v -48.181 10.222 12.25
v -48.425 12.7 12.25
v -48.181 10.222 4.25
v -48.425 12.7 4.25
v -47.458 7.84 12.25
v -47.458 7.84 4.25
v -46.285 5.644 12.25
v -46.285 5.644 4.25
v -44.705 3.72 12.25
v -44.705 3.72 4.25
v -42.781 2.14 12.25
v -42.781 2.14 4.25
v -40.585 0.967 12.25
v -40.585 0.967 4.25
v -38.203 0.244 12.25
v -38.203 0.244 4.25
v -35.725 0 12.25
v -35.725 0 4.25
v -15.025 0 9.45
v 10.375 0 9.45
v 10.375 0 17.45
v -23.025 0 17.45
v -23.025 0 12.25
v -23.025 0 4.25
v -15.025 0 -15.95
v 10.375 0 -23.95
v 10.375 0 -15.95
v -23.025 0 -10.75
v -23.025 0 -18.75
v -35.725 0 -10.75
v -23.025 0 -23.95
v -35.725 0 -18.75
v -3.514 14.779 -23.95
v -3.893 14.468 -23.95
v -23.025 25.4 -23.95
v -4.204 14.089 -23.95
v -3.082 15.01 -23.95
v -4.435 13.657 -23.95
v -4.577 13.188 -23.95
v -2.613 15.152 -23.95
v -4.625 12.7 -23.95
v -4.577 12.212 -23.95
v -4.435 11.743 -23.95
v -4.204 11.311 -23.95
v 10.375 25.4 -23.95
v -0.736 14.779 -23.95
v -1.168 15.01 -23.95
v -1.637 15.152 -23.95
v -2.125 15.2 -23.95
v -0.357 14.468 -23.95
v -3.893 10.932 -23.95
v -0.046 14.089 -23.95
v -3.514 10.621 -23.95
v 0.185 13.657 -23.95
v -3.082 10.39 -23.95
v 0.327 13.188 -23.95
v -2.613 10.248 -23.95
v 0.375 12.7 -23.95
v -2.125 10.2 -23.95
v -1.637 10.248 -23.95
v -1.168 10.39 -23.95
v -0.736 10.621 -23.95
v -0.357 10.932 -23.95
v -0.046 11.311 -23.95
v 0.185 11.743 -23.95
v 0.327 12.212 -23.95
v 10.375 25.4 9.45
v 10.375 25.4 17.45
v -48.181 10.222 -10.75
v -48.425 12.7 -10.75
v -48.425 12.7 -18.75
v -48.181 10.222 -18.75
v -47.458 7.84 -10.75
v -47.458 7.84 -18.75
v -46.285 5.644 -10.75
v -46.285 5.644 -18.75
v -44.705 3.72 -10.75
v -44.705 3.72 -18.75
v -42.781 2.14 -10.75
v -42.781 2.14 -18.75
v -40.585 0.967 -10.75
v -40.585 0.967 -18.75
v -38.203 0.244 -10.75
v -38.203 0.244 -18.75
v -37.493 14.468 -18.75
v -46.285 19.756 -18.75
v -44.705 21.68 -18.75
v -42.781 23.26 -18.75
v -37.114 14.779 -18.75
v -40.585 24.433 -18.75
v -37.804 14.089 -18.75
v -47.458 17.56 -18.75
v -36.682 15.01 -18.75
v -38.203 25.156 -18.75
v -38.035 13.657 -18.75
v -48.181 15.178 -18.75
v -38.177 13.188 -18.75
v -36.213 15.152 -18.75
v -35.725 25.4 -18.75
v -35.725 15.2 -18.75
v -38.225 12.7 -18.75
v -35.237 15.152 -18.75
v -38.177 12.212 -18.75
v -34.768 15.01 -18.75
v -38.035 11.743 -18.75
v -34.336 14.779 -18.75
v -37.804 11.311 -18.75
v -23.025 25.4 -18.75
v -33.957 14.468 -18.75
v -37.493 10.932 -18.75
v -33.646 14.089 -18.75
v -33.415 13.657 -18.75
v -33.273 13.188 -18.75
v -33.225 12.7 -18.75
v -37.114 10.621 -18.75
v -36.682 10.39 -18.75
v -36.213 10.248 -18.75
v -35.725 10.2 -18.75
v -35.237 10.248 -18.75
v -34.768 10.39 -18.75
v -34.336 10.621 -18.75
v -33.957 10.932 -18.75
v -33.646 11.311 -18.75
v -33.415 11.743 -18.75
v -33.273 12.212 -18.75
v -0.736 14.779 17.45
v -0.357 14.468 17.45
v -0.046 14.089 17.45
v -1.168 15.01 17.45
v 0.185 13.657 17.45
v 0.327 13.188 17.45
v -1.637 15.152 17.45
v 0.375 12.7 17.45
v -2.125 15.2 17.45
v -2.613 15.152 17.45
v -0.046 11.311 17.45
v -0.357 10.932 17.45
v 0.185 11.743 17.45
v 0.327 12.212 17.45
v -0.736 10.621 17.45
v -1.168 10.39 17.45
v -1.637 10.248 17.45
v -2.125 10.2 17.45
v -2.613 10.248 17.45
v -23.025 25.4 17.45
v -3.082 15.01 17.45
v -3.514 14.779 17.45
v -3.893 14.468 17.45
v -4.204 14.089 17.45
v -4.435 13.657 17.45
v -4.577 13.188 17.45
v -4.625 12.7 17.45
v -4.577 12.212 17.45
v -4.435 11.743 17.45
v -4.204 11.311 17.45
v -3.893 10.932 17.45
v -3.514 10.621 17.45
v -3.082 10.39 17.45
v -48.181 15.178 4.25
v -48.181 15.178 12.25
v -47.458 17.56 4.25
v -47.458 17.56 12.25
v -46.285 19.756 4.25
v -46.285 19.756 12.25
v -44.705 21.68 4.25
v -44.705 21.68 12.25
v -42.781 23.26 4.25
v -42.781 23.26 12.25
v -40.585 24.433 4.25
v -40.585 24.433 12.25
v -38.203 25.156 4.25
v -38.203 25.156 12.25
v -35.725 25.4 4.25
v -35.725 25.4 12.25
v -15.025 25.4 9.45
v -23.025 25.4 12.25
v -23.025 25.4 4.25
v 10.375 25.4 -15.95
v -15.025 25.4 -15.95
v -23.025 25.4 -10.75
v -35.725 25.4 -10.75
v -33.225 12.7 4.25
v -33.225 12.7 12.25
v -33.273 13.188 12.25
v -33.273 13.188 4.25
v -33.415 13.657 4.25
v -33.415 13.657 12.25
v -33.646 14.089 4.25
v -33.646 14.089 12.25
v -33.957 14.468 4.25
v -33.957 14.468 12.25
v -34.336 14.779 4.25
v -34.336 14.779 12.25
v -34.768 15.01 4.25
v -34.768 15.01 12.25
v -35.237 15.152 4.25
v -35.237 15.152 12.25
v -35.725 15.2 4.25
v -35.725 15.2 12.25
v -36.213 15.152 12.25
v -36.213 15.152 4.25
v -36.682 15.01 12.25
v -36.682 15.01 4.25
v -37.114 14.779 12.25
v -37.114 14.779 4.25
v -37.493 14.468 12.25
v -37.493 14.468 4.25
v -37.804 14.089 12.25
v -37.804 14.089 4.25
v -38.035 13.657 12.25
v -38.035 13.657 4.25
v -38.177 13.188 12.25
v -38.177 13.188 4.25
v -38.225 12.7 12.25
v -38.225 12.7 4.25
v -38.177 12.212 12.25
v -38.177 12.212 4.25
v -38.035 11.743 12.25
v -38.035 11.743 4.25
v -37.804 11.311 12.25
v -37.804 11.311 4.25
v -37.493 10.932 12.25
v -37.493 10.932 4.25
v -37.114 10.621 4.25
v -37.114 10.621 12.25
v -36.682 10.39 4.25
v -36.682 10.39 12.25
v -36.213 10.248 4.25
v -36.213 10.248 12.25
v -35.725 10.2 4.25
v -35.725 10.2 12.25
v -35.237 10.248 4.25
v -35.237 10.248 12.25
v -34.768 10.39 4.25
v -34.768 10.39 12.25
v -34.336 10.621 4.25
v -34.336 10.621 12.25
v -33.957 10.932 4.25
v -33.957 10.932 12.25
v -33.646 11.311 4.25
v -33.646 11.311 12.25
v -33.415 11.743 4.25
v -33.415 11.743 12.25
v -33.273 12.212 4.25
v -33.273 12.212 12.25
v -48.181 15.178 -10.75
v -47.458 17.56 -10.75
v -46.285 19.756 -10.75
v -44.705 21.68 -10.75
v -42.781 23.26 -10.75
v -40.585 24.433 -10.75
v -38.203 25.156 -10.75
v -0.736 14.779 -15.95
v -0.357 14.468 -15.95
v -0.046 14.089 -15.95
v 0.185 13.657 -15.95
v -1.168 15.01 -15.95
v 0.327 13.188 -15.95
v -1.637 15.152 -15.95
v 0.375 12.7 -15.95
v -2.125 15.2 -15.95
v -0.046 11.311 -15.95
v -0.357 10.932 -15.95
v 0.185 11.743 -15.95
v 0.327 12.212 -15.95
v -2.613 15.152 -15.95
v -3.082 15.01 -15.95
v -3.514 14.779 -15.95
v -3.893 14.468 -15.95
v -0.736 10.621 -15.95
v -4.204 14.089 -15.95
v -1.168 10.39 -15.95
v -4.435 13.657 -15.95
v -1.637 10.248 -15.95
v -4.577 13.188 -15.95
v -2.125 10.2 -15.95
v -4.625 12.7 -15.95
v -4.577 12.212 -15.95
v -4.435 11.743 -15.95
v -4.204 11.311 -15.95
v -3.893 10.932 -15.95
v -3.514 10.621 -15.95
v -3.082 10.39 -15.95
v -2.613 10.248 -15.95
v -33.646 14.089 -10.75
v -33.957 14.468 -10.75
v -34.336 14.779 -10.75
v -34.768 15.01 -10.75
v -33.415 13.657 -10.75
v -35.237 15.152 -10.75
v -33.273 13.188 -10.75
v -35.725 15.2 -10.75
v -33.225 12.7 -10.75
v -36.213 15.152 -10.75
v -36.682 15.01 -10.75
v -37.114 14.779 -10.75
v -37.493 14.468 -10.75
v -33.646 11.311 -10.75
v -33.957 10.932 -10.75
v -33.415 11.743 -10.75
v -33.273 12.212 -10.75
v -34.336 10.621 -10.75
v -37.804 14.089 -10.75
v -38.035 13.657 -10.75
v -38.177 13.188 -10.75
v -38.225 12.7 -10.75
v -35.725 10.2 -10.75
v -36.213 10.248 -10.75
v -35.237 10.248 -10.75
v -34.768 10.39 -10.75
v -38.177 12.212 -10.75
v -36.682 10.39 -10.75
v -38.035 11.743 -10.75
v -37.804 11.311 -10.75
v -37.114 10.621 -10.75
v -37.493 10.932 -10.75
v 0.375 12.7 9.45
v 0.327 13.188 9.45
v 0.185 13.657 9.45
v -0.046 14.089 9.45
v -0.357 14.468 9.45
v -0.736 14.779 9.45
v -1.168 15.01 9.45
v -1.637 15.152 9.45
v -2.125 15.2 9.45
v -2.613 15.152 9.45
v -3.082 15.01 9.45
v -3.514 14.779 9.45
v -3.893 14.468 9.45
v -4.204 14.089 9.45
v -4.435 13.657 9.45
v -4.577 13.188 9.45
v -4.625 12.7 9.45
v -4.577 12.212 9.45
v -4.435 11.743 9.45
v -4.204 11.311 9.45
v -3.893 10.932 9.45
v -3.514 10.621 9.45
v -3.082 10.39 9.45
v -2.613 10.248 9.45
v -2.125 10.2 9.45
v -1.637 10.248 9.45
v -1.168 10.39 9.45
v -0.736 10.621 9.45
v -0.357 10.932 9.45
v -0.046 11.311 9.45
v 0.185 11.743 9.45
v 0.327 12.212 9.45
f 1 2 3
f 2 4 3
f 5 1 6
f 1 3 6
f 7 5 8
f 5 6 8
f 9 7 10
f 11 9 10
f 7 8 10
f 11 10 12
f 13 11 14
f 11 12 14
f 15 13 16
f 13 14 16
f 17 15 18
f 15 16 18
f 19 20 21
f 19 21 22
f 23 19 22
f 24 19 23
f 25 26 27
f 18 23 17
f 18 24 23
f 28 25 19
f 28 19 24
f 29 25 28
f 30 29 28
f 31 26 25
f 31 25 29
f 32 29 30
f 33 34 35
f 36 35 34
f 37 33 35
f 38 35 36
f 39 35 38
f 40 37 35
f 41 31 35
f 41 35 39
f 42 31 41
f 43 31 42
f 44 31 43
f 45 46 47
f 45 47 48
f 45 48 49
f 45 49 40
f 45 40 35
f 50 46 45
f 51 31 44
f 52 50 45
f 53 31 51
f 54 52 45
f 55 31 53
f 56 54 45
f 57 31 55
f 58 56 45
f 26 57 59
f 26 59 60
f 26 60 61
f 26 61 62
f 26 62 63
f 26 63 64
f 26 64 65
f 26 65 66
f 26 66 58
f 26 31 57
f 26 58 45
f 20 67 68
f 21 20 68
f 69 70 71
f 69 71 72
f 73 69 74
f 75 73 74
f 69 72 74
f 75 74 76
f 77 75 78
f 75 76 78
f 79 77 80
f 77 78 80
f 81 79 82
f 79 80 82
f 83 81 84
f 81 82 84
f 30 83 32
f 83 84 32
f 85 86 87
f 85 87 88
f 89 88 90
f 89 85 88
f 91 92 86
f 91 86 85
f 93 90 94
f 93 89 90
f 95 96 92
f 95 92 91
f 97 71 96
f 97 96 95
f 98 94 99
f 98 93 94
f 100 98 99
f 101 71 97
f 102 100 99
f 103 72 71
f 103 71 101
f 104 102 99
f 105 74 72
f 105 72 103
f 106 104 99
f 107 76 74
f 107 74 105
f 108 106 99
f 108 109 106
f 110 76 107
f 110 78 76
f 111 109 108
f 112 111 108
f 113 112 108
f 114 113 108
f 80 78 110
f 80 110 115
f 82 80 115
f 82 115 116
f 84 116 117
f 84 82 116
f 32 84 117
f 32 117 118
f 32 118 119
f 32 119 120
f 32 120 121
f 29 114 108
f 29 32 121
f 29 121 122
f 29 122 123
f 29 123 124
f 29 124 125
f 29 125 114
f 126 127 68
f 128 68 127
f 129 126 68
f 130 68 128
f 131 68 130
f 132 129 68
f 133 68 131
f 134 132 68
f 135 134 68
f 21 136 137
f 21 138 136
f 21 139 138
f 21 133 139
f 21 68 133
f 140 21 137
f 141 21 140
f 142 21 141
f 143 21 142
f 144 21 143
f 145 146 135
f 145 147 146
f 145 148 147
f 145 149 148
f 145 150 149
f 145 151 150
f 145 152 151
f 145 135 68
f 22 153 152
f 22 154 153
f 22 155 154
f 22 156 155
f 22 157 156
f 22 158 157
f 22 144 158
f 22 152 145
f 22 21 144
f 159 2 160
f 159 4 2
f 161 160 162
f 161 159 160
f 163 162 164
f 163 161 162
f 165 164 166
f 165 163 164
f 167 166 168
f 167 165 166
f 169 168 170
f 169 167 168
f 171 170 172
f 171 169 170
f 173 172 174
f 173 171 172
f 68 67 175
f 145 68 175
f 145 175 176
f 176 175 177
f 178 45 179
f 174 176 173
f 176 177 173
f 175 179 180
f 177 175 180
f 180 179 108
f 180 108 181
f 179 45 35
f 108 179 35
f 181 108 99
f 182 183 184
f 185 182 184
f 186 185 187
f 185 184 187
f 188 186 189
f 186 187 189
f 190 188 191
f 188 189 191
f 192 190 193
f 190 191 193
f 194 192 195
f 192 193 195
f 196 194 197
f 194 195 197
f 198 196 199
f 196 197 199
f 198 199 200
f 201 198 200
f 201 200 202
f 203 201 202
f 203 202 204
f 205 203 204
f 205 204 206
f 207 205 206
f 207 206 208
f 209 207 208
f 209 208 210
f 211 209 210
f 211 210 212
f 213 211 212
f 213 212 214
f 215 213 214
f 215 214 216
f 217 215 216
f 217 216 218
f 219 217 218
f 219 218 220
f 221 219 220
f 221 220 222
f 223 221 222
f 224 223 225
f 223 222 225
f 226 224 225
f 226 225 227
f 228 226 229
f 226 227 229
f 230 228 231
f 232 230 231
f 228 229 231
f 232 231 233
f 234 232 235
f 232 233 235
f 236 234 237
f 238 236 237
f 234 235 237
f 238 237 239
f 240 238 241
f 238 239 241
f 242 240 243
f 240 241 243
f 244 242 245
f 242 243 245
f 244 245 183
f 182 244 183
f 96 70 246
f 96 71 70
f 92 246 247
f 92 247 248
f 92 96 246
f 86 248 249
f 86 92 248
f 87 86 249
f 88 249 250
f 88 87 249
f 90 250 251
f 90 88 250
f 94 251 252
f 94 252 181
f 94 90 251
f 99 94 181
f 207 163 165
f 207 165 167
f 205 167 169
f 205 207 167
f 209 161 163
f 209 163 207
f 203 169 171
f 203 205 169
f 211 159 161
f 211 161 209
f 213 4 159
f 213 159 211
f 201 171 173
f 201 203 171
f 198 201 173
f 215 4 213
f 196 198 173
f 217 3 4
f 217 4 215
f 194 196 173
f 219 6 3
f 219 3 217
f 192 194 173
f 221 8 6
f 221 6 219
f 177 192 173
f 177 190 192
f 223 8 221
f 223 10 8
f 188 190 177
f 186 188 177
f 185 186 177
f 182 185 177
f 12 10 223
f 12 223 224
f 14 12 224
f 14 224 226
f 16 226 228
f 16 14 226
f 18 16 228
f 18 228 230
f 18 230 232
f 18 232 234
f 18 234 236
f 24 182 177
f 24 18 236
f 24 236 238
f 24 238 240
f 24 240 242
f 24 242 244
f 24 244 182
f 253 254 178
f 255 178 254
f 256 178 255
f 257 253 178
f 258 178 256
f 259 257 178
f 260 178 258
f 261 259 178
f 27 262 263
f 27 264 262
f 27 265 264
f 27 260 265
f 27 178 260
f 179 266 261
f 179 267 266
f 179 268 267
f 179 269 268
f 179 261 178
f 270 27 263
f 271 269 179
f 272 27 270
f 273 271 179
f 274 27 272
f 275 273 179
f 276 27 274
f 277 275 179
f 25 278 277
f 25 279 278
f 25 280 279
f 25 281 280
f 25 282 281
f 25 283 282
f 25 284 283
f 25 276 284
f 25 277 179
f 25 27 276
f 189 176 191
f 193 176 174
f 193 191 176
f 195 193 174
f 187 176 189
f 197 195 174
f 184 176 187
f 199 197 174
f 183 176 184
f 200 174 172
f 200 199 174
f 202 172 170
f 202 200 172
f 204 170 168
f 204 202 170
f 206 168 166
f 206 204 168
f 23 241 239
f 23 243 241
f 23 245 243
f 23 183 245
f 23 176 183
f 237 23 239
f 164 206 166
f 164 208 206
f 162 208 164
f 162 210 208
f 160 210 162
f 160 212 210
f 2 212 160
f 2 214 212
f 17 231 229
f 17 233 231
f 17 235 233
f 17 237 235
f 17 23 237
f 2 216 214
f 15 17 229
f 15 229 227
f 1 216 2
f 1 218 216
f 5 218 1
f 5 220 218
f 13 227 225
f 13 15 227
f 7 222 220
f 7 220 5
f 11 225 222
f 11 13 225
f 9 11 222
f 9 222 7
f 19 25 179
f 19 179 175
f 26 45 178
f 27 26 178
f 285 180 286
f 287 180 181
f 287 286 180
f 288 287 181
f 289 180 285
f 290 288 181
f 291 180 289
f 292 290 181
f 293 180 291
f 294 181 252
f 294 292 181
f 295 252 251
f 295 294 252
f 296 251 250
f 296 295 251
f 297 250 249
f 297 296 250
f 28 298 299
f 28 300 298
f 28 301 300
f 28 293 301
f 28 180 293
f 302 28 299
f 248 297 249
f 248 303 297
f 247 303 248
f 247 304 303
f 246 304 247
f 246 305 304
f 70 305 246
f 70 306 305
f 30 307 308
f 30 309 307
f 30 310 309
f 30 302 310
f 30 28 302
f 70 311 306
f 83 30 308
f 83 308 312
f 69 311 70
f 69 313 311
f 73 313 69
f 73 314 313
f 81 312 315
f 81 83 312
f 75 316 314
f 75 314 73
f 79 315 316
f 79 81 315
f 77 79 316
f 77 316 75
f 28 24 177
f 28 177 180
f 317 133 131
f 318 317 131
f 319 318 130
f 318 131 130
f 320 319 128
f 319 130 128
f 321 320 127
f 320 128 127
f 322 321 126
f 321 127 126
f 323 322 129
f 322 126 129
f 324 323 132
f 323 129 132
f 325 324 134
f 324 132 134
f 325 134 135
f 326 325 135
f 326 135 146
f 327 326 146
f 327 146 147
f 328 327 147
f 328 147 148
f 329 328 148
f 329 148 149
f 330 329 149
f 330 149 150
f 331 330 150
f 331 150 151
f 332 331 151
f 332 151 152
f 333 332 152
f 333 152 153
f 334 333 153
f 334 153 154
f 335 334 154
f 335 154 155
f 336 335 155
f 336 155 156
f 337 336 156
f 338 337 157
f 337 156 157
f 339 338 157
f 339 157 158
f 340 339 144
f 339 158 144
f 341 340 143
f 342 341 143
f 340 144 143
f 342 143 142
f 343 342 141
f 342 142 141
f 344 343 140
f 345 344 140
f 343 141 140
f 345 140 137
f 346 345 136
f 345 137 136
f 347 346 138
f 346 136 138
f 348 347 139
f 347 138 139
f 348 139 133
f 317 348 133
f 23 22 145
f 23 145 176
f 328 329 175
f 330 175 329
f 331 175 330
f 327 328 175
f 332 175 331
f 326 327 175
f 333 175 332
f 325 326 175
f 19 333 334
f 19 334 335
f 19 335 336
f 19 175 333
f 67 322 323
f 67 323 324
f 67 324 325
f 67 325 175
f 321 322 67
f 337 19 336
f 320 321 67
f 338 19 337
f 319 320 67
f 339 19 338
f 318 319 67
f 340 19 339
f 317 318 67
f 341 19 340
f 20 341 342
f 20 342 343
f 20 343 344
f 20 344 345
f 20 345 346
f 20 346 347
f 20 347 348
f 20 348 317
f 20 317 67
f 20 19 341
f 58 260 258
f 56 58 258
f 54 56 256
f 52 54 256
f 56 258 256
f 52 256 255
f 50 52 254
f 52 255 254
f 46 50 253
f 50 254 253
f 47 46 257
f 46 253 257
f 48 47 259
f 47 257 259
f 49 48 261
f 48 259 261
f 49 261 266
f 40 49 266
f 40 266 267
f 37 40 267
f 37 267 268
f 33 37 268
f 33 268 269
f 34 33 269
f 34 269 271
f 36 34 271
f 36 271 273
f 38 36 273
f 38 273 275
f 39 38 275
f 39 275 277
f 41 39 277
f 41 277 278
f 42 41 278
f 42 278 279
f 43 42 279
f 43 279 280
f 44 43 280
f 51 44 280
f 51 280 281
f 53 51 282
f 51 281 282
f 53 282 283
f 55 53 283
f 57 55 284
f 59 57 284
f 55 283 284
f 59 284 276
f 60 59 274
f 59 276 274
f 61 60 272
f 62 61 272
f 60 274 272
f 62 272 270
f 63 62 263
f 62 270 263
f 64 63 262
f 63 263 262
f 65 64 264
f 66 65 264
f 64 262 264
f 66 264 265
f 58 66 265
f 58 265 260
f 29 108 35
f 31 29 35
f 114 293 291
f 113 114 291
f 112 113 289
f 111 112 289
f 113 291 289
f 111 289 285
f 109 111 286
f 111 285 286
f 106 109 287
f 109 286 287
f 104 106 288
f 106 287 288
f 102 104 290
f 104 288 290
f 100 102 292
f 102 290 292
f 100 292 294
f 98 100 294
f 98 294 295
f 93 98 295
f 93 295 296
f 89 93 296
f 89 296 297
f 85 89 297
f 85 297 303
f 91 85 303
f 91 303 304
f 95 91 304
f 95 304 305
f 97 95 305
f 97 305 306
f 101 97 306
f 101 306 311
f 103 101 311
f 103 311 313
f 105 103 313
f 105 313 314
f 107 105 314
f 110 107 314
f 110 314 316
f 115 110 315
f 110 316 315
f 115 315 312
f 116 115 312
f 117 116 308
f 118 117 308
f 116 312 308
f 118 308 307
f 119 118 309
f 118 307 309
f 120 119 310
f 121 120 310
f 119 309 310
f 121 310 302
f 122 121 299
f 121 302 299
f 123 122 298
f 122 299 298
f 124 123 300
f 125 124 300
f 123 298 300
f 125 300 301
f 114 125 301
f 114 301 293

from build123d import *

# Parameters (mm, degrees)
BOSS_EXTRUDE1_DEPTH = 25.4
FILLET1_R           = 12.7
CUT_EXTRUDE1_REACH  = 67.579
SKETCH2_R           = 2.5
CUT_EXTRUDE2_REACH  = 70.586
SKETCH3_R           = 2.5


with BuildPart() as part:
    # Sketch1 → Boss-Extrude1 (new body)
    with BuildSketch(Plane(origin=(0, 0, 0), x_dir=(1, 0, 0), z_dir=(0, 1, 0))):
        Polygon((10.375, 15.95), (-15.025, 15.95), (-15.025, -9.45), (10.375, -9.45), (10.375, -17.45), (-23.025, -17.45), (-23.025, -12.25), (-48.425, -12.25), (-48.425, -4.25), (-23.025, -4.25), (-23.025, 10.75), (-48.425, 10.75), (-48.425, 18.75), (-23.025, 18.75), (-23.025, 23.95), (10.375, 23.95), align=None)
    extrude(amount=BOSS_EXTRUDE1_DEPTH)

    # Fillet1
    fillet1_edges = [part.edges().sort_by_distance(p)[0] for p in [
        (-48.425, 25.4, -14.75),
        (-48.425, 0, -14.75),
        (-48.425, 0, 8.25),
        (-48.425, 25.4, 8.25),
    ]]
    fillet(fillet1_edges, radius=FILLET1_R - 0.0001)  # a hair under: the kernel refuses the full size

    # Cut-Extrude1: up to this face of the body (flat: up to its plane)
    cut_extrude1_end = Plane(part.part.faces().sort_by_distance((-34.539475021, 12.7, -18.75))[0])
    # Sketch2 → Cut-Extrude1 (cut, up to the picked face)
    with BuildSketch(Plane.XY.offset(12.25), mode=Mode.PRIVATE) as cut_extrude1_sk1:
        with Locations((-35.725, 12.7)):
            Circle(SKETCH2_R)
    cut_extrude1_tool1 = split(extrude(cut_extrude1_sk1.sketch, amount=-CUT_EXTRUDE1_REACH, mode=Mode.PRIVATE), bisect_by=cut_extrude1_end, keep=Keep.BOTH, mode=Mode.PRIVATE)
    add(cut_extrude1_tool1.solids().sort_by(Axis((-35.725, 12.7, 12.25), (0, 0, -1)))[0], mode=Mode.SUBTRACT)

    # Cut-Extrude2: up to this face of the body (flat: up to its plane)
    cut_extrude2_end = Plane(part.part.faces().sort_by_distance((-6.325, 12.7, -23.95))[0])
    # Sketch3 → Cut-Extrude2 (cut, up to the picked face)
    with BuildSketch(Plane.XY.offset(17.45), mode=Mode.PRIVATE) as cut_extrude2_sk1:
        with Locations((-2.125, 12.7)):
            Circle(SKETCH3_R)
    cut_extrude2_tool1 = split(extrude(cut_extrude2_sk1.sketch, amount=-CUT_EXTRUDE2_REACH, mode=Mode.PRIVATE), bisect_by=cut_extrude2_end, keep=Keep.BOTH, mode=Mode.PRIVATE)
    add(cut_extrude2_tool1.solids().sort_by(Axis((-2.125, 12.7, 17.45), (0, 0, -1)))[0], mode=Mode.SUBTRACT)


solid = part.part
